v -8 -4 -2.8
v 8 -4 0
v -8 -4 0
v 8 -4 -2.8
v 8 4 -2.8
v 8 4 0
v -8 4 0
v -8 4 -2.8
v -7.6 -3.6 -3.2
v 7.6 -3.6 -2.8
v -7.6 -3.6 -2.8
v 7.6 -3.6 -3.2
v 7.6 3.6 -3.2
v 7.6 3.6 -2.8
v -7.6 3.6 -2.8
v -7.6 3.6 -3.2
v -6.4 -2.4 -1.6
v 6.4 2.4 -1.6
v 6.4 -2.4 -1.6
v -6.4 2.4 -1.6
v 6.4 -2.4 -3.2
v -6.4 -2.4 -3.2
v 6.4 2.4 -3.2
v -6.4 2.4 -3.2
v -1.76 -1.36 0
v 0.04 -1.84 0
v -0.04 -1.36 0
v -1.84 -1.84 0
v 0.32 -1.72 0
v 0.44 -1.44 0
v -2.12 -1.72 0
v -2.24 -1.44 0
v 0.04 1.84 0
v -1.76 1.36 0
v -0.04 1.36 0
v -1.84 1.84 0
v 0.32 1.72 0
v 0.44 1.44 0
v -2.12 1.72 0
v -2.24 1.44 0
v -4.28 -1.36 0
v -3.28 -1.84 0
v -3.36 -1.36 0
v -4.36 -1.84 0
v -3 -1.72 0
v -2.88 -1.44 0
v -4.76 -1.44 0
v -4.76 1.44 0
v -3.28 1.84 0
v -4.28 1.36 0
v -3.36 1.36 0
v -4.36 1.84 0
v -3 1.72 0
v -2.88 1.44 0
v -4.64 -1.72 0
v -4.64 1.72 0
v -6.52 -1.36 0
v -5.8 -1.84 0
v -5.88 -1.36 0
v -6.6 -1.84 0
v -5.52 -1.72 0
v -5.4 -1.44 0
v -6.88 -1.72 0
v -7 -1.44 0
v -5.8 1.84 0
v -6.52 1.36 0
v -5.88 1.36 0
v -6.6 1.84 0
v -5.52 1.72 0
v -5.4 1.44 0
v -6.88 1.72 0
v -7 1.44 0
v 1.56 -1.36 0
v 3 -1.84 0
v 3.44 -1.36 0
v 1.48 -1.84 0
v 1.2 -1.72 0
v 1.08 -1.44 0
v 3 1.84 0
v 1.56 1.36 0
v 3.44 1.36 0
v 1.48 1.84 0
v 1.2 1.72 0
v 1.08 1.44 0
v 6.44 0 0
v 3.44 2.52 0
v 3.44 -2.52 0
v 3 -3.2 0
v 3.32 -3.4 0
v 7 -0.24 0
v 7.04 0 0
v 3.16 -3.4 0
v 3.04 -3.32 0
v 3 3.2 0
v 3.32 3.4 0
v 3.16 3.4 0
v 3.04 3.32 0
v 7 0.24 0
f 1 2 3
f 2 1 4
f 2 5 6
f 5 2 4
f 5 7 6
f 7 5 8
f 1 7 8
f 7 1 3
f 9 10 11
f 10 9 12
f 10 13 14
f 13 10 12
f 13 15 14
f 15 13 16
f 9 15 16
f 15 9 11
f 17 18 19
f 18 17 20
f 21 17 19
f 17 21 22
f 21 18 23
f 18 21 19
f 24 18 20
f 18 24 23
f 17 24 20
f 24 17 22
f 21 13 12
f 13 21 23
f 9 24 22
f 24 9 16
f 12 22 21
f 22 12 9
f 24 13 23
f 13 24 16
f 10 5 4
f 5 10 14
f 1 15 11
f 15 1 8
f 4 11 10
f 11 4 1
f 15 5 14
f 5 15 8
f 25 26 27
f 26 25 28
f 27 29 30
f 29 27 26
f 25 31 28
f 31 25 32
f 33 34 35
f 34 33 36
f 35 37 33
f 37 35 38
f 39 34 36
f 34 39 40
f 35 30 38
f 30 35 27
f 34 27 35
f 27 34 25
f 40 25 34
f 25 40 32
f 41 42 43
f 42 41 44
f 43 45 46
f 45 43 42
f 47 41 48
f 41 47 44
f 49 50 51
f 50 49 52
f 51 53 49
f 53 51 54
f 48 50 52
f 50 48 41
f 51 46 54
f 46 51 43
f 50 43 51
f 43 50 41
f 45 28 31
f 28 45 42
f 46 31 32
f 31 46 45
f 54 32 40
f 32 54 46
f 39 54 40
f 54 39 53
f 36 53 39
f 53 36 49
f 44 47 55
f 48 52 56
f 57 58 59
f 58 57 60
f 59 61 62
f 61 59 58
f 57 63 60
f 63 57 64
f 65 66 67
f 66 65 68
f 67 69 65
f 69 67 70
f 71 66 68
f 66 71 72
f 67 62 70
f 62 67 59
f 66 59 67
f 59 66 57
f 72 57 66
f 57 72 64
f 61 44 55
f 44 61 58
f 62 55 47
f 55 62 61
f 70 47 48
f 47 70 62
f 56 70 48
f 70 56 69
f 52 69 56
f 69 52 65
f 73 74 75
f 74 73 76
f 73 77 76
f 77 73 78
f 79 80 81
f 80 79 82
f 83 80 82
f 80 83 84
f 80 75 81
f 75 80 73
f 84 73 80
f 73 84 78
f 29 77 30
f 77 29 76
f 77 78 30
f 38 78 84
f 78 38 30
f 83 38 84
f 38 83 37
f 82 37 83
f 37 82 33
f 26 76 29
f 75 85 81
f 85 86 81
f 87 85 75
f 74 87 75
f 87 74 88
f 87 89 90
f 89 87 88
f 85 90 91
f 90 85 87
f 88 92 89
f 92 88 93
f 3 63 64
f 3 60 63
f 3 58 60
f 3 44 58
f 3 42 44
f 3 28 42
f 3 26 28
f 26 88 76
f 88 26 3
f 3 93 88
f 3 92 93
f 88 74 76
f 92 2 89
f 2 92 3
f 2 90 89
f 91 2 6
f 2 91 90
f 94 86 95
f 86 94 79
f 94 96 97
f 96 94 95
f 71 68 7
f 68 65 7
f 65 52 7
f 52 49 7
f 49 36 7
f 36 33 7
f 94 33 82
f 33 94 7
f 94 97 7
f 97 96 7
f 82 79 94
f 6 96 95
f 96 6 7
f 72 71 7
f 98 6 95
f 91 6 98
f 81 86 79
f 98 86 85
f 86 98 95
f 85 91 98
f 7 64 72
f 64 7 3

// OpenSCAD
// file: ../p/box5.scad
use <../lib.scad>
function ldraw_lib__box5() = [
// 0 Box with 5 Faces and All Edges
// 0 Name: box5.dat
// 0 Author: James Jessiman
// 0 !LDRAW_ORG Primitive UPDATE 2012-01
// 0 !LICENSE Licensed under CC BY 2.0 and CC BY 4.0 : see CAreadme.txt
// 
// 0 BFC CERTIFY CCW
  [0,"BFC","CERTIFY"],
  [0,"BFC","CCW"],
// 
// 0 !HISTORY 2002-04-03 [sbliss] Modified for BFC compliance
// 0 !HISTORY 2002-04-25 [PTadmin] Official Update 2002-02
// 0 !HISTORY 2007-06-24 [PTadmin] Header formatted for Contributor Agreement
// 0 !HISTORY 2008-07-01 [PTadmin] Official Update 2008-01
// 0 !HISTORY 2012-02-16 [Philo] Changed to CCW
// 0 !HISTORY 2012-03-30 [PTadmin] Official Update 2012-01
// 
// 
// 2 24 1 1 1 -1 1 1
  [2,24,1,1,1,-1,1,1],
// 2 24 -1 1 1 -1 1 -1
  [2,24,-1,1,1,-1,1,-1],
// 2 24 -1 1 -1 1 1 -1
  [2,24,-1,1,-1,1,1,-1],
// 2 24 1 1 -1 1 1 1
  [2,24,1,1,-1,1,1,1],
// 2 24 1 0 1 -1 0 1
  [2,24,1,0,1,-1,0,1],
// 2 24 -1 0 1 -1 0 -1
  [2,24,-1,0,1,-1,0,-1],
// 2 24 -1 0 -1 1 0 -1
  [2,24,-1,0,-1,1,0,-1],
// 2 24 1 0 -1 1 0 1
  [2,24,1,0,-1,1,0,1],
// 2 24 1 0 1 1 1 1
  [2,24,1,0,1,1,1,1],
// 2 24 -1 0 1 -1 1 1
  [2,24,-1,0,1,-1,1,1],
// 2 24 1 0 -1 1 1 -1
  [2,24,1,0,-1,1,1,-1],
// 2 24 -1 0 -1 -1 1 -1
  [2,24,-1,0,-1,-1,1,-1],
// 4 16 -1 1 1 1 1 1 1 1 -1 -1 1 -1
  [4,16,-1,1,1,1,1,1,1,1,-1,-1,1,-1],
// 4 16 -1 1 1 -1 0 1 1 0 1 1 1 1
  [4,16,-1,1,1,-1,0,1,1,0,1,1,1,1],
// 4 16 -1 1 -1 -1 0 -1 -1 0 1 -1 1 1
  [4,16,-1,1,-1,-1,0,-1,-1,0,1,-1,1,1],
// 4 16 1 1 -1 1 0 -1 -1 0 -1 -1 1 -1
  [4,16,1,1,-1,1,0,-1,-1,0,-1,-1,1,-1],
// 4 16 1 1 1 1 0 1 1 0 -1 1 1 -1
  [4,16,1,1,1,1,0,1,1,0,-1,1,1,-1],
];
module ldraw_lib__box5(step=0, col=false, unit=2/5, alt=false, line=0.2, solid=!$preview)
    makepoly(ldraw_lib__box5(), step=step, col=col, unit=unit, alt=alt, line=line, solid=solid);
ldraw_lib__box5(line=0.2);
// file: ../p/box4.scad
use <../lib.scad>
function ldraw_lib__box4() = [
// 0 Box with 4 Faces (2 Parallel Pairs) and All Edges
// 0 Name: box4.dat
// 0 Author: James Jessiman
// 0 !LDRAW_ORG Primitive UPDATE 2012-01
// 0 !LICENSE Licensed under CC BY 2.0 and CC BY 4.0 : see CAreadme.txt
// 
// 0 BFC CERTIFY CCW
  [0,"BFC","CERTIFY"],
  [0,"BFC","CCW"],
// 
// 0 !HISTORY 2002-04-03 [sbliss] Modified for BFC compliance
// 0 !HISTORY 2002-04-25 [PTadmin] Official Update 2002-02
// 0 !HISTORY 2007-06-24 [PTadmin] Header formatted for Contributor Agreement
// 0 !HISTORY 2008-07-01 [PTadmin] Official Update 2008-01
// 0 !HISTORY 2012-02-16 [Philo] Changed to CCW
// 0 !HISTORY 2012-03-30 [PTadmin] Official Update 2012-01
// 
// 
// 2 24 1 1 1 -1 1 1
  [2,24,1,1,1,-1,1,1],
// 2 24 -1 1 1 -1 1 -1
  [2,24,-1,1,1,-1,1,-1],
// 2 24 -1 1 -1 1 1 -1
  [2,24,-1,1,-1,1,1,-1],
// 2 24 1 1 -1 1 1 1
  [2,24,1,1,-1,1,1,1],
// 2 24 1 0 1 -1 0 1
  [2,24,1,0,1,-1,0,1],
// 2 24 -1 0 1 -1 0 -1
  [2,24,-1,0,1,-1,0,-1],
// 2 24 -1 0 -1 1 0 -1
  [2,24,-1,0,-1,1,0,-1],
// 2 24 1 0 -1 1 0 1
  [2,24,1,0,-1,1,0,1],
// 2 24 1 0 1 1 1 1
  [2,24,1,0,1,1,1,1],
// 2 24 -1 0 1 -1 1 1
  [2,24,-1,0,1,-1,1,1],
// 2 24 1 0 -1 1 1 -1
  [2,24,1,0,-1,1,1,-1],
// 2 24 -1 0 -1 -1 1 -1
  [2,24,-1,0,-1,-1,1,-1],
// 4 16 -1 1 1 -1 0 1 1 0 1 1 1 1
  [4,16,-1,1,1,-1,0,1,1,0,1,1,1,1],
// 4 16 -1 1 -1 -1 0 -1 -1 0 1 -1 1 1
  [4,16,-1,1,-1,-1,0,-1,-1,0,1,-1,1,1],
// 4 16 1 1 -1 1 0 -1 -1 0 -1 -1 1 -1
  [4,16,1,1,-1,1,0,-1,-1,0,-1,-1,1,-1],
// 4 16 1 1 1 1 0 1 1 0 -1 1 1 -1
  [4,16,1,1,1,1,0,1,1,0,-1,1,1,-1],
];
module ldraw_lib__box4(step=0, col=false, unit=2/5, alt=false, line=0.2, solid=!$preview)
    makepoly(ldraw_lib__box4(), step=step, col=col, unit=unit, alt=alt, line=line, solid=solid);
ldraw_lib__box4(line=0.2);
// file: s/3069bs01.scad
use <../../lib.scad>
use <../../p/box4.scad>
use <../../p/box5.scad>
function ldraw_lib__s__3069bs01() = [
// 0 ~Tile  1 x  2 with Groove without Top Face
// 0 Name: s\3069bs01.dat
// 0 Author: Santeri Piippo [arezey]
// 0 !LDRAW_ORG Subpart UPDATE 2010-02
// 0 !LICENSE Licensed under CC BY 2.0 and CC BY 4.0 : see CAreadme.txt
// 
// 0 BFC CERTIFY CCW
  [0,"BFC","CERTIFY"],
  [0,"BFC","CCW"],
// 
// 0 !HISTORY 2010-07-05 [PTadmin] Official Update 2010-02
// 
// 
// 1 16 0 0 0 20 0 0 0 7 0 0 0 10 box4.dat
  [1,16,0,0,0,20,0,0,0,7,0,0,0,10, ldraw_lib__box4()],
// 1 16 0 7 0 19 0 0 0 1 0 0 0 9 box4.dat
  [1,16,0,7,0,19,0,0,0,1,0,0,0,9, ldraw_lib__box4()],
// 0 BFC INVERTNEXT
  [0,"BFC","INVERTNEXT"],
// 1 16 0 8 0 16 0 0 0 -4 0 0 0 6 box5.dat
  [1,16,0,8,0,16,0,0,0,-4,0,0,0,6, ldraw_lib__box5()],
// 4 16 -19 8 9 -16 8 6 -16 8 -6 -19 8 -9
  [4,16,-19,8,9,-16,8,6,-16,8,-6,-19,8,-9],
// 4 16 19 8 -9 16 8 -6 16 8 6 19 8 9
  [4,16,19,8,-9,16,8,-6,16,8,6,19,8,9],
// 4 16 19 8 9 16 8 6 -16 8 6 -19 8 9
  [4,16,19,8,9,16,8,6,-16,8,6,-19,8,9],
// 4 16 -19 8 -9 -16 8 -6 16 8 -6 19 8 -9
  [4,16,-19,8,-9,-16,8,-6,16,8,-6,19,8,-9],
// 4 16 -20 7 10 -19 7 9 -19 7 -9 -20 7 -10
  [4,16,-20,7,10,-19,7,9,-19,7,-9,-20,7,-10],
// 4 16 20 7 -10 19 7 -9 19 7 9 20 7 10
  [4,16,20,7,-10,19,7,-9,19,7,9,20,7,10],
// 4 16 20 7 10 19 7 9 -19 7 9 -20 7 10
  [4,16,20,7,10,19,7,9,-19,7,9,-20,7,10],
// 4 16 -20 7 -10 -19 7 -9 19 7 -9 20 7 -10
  [4,16,-20,7,-10,-19,7,-9,19,7,-9,20,7,-10],
// 0 //
];
module ldraw_lib__s__3069bs01(step=0, col=false, unit=2/5, alt=false, line=0.2, solid=!$preview)
    makepoly(ldraw_lib__s__3069bs01(), step=step, col=col, unit=unit, alt=alt, line=line, solid=solid);
ldraw_lib__s__3069bs01(line=0.2);
// main file
use <../lib.scad>
use <s/3069bs01.scad>
function ldraw_lib__3069bp19() = [
// 0 Tile  1 x  2 with Arrow Dotted Yellow with Black Border Pattern
// 0 Name: 3069bp19.dat
// 0 Author: Philippe Hurbain [Philo]
// 0 !LDRAW_ORG Part UPDATE 2017-01
// 0 !LICENSE Licensed under CC BY 2.0 and CC BY 4.0 : see CAreadme.txt
// 
// 0 BFC CERTIFY CCW
  [0,"BFC","CERTIFY"],
  [0,"BFC","CCW"],
// 
// 0 !KEYWORDS Boost, Set 17101
// 
// 0 !HISTORY 2017-12-30 [PTadmin] Official Update 2017-01
// 
// 
// 1 16 0 0 0 -1 0 0 0 1 0 0 0 -1 s\3069bs01.dat
  [1,16,0,0,0,-1,0,0,0,1,0,0,0,-1, ldraw_lib__s__3069bs01()],
// 4 0 0.1 0 -4.6 -0.1 0 -3.4 -4.4 0 -3.4 -4.6 0 -4.6
  [4,0,0.1,0,-4.6,-0.1,0,-3.4,-4.4,0,-3.4,-4.6,0,-4.6],
// 4 0 1.1 0 -3.6 -0.1 0 -3.4 0.1 0 -4.6 0.8 0 -4.3
  [4,0,1.1,0,-3.6,-0.1,0,-3.4,0.1,0,-4.6,0.8,0,-4.3],
// 4 0 -4.6 0 -4.6 -4.4 0 -3.4 -5.6 0 -3.6 -5.3 0 -4.3
  [4,0,-4.6,0,-4.6,-4.4,0,-3.4,-5.6,0,-3.6,-5.3,0,-4.3],
// 4 0 -4.4 0 3.4 -0.1 0 3.4 0.1 0 4.6 -4.6 0 4.6
  [4,0,-4.4,0,3.4,-0.1,0,3.4,0.1,0,4.6,-4.6,0,4.6],
// 4 0 0.1 0 4.6 -0.1 0 3.4 1.1 0 3.6 0.8 0 4.3
  [4,0,0.1,0,4.6,-0.1,0,3.4,1.1,0,3.6,0.8,0,4.3],
// 4 0 -5.6 0 3.6 -4.4 0 3.4 -4.6 0 4.6 -5.3 0 4.3
  [4,0,-5.6,0,3.6,-4.4,0,3.4,-4.6,0,4.6,-5.3,0,4.3],
// 4 0 -0.1 0 -3.4 1.1 0 -3.6 1.1 0 3.6 -0.1 0 3.4
  [4,0,-0.1,0,-3.4,1.1,0,-3.6,1.1,0,3.6,-0.1,0,3.4],
// 4 14 -0.1 0 -3.4 -0.1 0 3.4 -4.4 0 3.4 -4.4 0 -3.4
  [4,14,-0.1,0,-3.4,-0.1,0,3.4,-4.4,0,3.4,-4.4,0,-3.4],
// 4 0 -4.4 0 -3.4 -4.4 0 3.4 -5.6 0 3.6 -5.6 0 -3.6
  [4,0,-4.4,0,-3.4,-4.4,0,3.4,-5.6,0,3.6,-5.6,0,-3.6],
// 4 0 -8.2 0 -4.6 -8.4 0 -3.4 -10.7 0 -3.4 -10.9 0 -4.6
  [4,0,-8.2,0,-4.6,-8.4,0,-3.4,-10.7,0,-3.4,-10.9,0,-4.6],
// 4 0 -7.2 0 -3.6 -8.4 0 -3.4 -8.2 0 -4.6 -7.5 0 -4.3
  [4,0,-7.2,0,-3.6,-8.4,0,-3.4,-8.2,0,-4.6,-7.5,0,-4.3],
// 4 0 -11.9 0 -3.6 -10.9 0 -4.6 -10.7 0 -3.4 -11.9 0 3.6
  [4,0,-11.9,0,-3.6,-10.9,0,-4.6,-10.7,0,-3.4,-11.9,0,3.6],
// 4 0 -10.7 0 3.4 -8.4 0 3.4 -8.2 0 4.6 -10.9 0 4.6
  [4,0,-10.7,0,3.4,-8.4,0,3.4,-8.2,0,4.6,-10.9,0,4.6],
// 4 0 -8.2 0 4.6 -8.4 0 3.4 -7.2 0 3.6 -7.5 0 4.3
  [4,0,-8.2,0,4.6,-8.4,0,3.4,-7.2,0,3.6,-7.5,0,4.3],
// 4 0 -10.7 0 3.4 -10.9 0 4.6 -11.9 0 3.6 -10.7 0 -3.4
  [4,0,-10.7,0,3.4,-10.9,0,4.6,-11.9,0,3.6,-10.7,0,-3.4],
// 4 0 -8.4 0 -3.4 -7.2 0 -3.6 -7.2 0 3.6 -8.4 0 3.4
  [4,0,-8.4,0,-3.4,-7.2,0,-3.6,-7.2,0,3.6,-8.4,0,3.4],
// 4 14 -8.4 0 -3.4 -8.4 0 3.4 -10.7 0 3.4 -10.7 0 -3.4
  [4,14,-8.4,0,-3.4,-8.4,0,3.4,-10.7,0,3.4,-10.7,0,-3.4],
// 4 16 -7.5 0 -4.3 -8.2 0 -4.6 -4.6 0 -4.6 -5.3 0 -4.3
  [4,16,-7.5,0,-4.3,-8.2,0,-4.6,-4.6,0,-4.6,-5.3,0,-4.3],
// 4 16 -7.2 0 -3.6 -7.5 0 -4.3 -5.3 0 -4.3 -5.6 0 -3.6
  [4,16,-7.2,0,-3.6,-7.5,0,-4.3,-5.3,0,-4.3,-5.6,0,-3.6],
// 4 16 -7.2 0 3.6 -7.2 0 -3.6 -5.6 0 -3.6 -5.6 0 3.6
  [4,16,-7.2,0,3.6,-7.2,0,-3.6,-5.6,0,-3.6,-5.6,0,3.6],
// 4 16 -7.5 0 4.3 -7.2 0 3.6 -5.6 0 3.6 -5.3 0 4.3
  [4,16,-7.5,0,4.3,-7.2,0,3.6,-5.6,0,3.6,-5.3,0,4.3],
// 4 16 -8.2 0 4.6 -7.5 0 4.3 -5.3 0 4.3 -4.6 0 4.6
  [4,16,-8.2,0,4.6,-7.5,0,4.3,-5.3,0,4.3,-4.6,0,4.6],
// 3 0 -10.9 0 -4.6 -11.9 0 -3.6 -11.6 0 -4.3
  [3,0,-10.9,0,-4.6,-11.9,0,-3.6,-11.6,0,-4.3],
// 3 0 -11.9 0 3.6 -10.9 0 4.6 -11.6 0 4.3
  [3,0,-11.9,0,3.6,-10.9,0,4.6,-11.6,0,4.3],
// 4 0 -14.5 0 -4.6 -14.7 0 -3.4 -16.3 0 -3.4 -16.5 0 -4.6
  [4,0,-14.5,0,-4.6,-14.7,0,-3.4,-16.3,0,-3.4,-16.5,0,-4.6],
// 4 0 -13.5 0 -3.6 -14.7 0 -3.4 -14.5 0 -4.6 -13.8 0 -4.3
  [4,0,-13.5,0,-3.6,-14.7,0,-3.4,-14.5,0,-4.6,-13.8,0,-4.3],
// 4 0 -16.5 0 -4.6 -16.3 0 -3.4 -17.5 0 -3.6 -17.2 0 -4.3
  [4,0,-16.5,0,-4.6,-16.3,0,-3.4,-17.5,0,-3.6,-17.2,0,-4.3],
// 4 0 -16.3 0 3.4 -14.7 0 3.4 -14.5 0 4.6 -16.5 0 4.6
  [4,0,-16.3,0,3.4,-14.7,0,3.4,-14.5,0,4.6,-16.5,0,4.6],
// 4 0 -14.5 0 4.6 -14.7 0 3.4 -13.5 0 3.6 -13.8 0 4.3
  [4,0,-14.5,0,4.6,-14.7,0,3.4,-13.5,0,3.6,-13.8,0,4.3],
// 4 0 -17.5 0 3.6 -16.3 0 3.4 -16.5 0 4.6 -17.2 0 4.3
  [4,0,-17.5,0,3.6,-16.3,0,3.4,-16.5,0,4.6,-17.2,0,4.3],
// 4 0 -14.7 0 -3.4 -13.5 0 -3.6 -13.5 0 3.6 -14.7 0 3.4
  [4,0,-14.7,0,-3.4,-13.5,0,-3.6,-13.5,0,3.6,-14.7,0,3.4],
// 4 14 -14.7 0 -3.4 -14.7 0 3.4 -16.3 0 3.4 -16.3 0 -3.4
  [4,14,-14.7,0,-3.4,-14.7,0,3.4,-16.3,0,3.4,-16.3,0,-3.4],
// 4 0 -16.3 0 -3.4 -16.3 0 3.4 -17.5 0 3.6 -17.5 0 -3.6
  [4,0,-16.3,0,-3.4,-16.3,0,3.4,-17.5,0,3.6,-17.5,0,-3.6],
// 4 16 -13.8 0 -4.3 -14.5 0 -4.6 -10.9 0 -4.6 -11.6 0 -4.3
  [4,16,-13.8,0,-4.3,-14.5,0,-4.6,-10.9,0,-4.6,-11.6,0,-4.3],
// 4 16 -13.5 0 -3.6 -13.8 0 -4.3 -11.6 0 -4.3 -11.9 0 -3.6
  [4,16,-13.5,0,-3.6,-13.8,0,-4.3,-11.6,0,-4.3,-11.9,0,-3.6],
// 4 16 -13.5 0 3.6 -13.5 0 -3.6 -11.9 0 -3.6 -11.9 0 3.6
  [4,16,-13.5,0,3.6,-13.5,0,-3.6,-11.9,0,-3.6,-11.9,0,3.6],
// 4 16 -13.8 0 4.3 -13.5 0 3.6 -11.9 0 3.6 -11.6 0 4.3
  [4,16,-13.8,0,4.3,-13.5,0,3.6,-11.9,0,3.6,-11.6,0,4.3],
// 4 16 -14.5 0 4.6 -13.8 0 4.3 -11.6 0 4.3 -10.9 0 4.6
  [4,16,-14.5,0,4.6,-13.8,0,4.3,-11.6,0,4.3,-10.9,0,4.6],
// 4 0 7.5 0 -4.6 8.6 0 -3.4 3.9 0 -3.4 3.7 0 -4.6
  [4,0,7.5,0,-4.6,8.6,0,-3.4,3.9,0,-3.4,3.7,0,-4.6],
// 4 0 3.7 0 -4.6 3.9 0 -3.4 2.7 0 -3.6 3 0 -4.3
  [4,0,3.7,0,-4.6,3.9,0,-3.4,2.7,0,-3.6,3,0,-4.3],
// 4 0 3.9 0 3.4 8.6 0 3.4 7.5 0 4.6 3.7 0 4.6
  [4,0,3.9,0,3.4,8.6,0,3.4,7.5,0,4.6,3.7,0,4.6],
// 4 0 2.7 0 3.6 3.9 0 3.4 3.7 0 4.6 3 0 4.3
  [4,0,2.7,0,3.6,3.9,0,3.4,3.7,0,4.6,3,0,4.3],
// 4 14 8.6 0 -3.4 8.6 0 3.4 3.9 0 3.4 3.9 0 -3.4
  [4,14,8.6,0,-3.4,8.6,0,3.4,3.9,0,3.4,3.9,0,-3.4],
// 4 0 3.9 0 -3.4 3.9 0 3.4 2.7 0 3.6 2.7 0 -3.6
  [4,0,3.9,0,-3.4,3.9,0,3.4,2.7,0,3.6,2.7,0,-3.6],
// 4 16 0.8 0 -4.3 3.7 0 -4.6 3 0 -4.3 1.1 0 -3.6
  [4,16,0.8,0,-4.3,3.7,0,-4.6,3,0,-4.3,1.1,0,-3.6],
// 3 16 3 0 -4.3 2.7 0 -3.6 1.1 0 -3.6
  [3,16,3,0,-4.3,2.7,0,-3.6,1.1,0,-3.6],
// 4 16 1.1 0 3.6 1.1 0 -3.6 2.7 0 -3.6 2.7 0 3.6
  [4,16,1.1,0,3.6,1.1,0,-3.6,2.7,0,-3.6,2.7,0,3.6],
// 4 16 0.8 0 4.3 1.1 0 3.6 2.7 0 3.6 3 0 4.3
  [4,16,0.8,0,4.3,1.1,0,3.6,2.7,0,3.6,3,0,4.3],
// 4 16 3 0 4.3 3.7 0 4.6 0.1 0 4.6 0.8 0 4.3
  [4,16,3,0,4.3,3.7,0,4.6,0.1,0,4.6,0.8,0,4.3],
// 3 16 0.1 0 -4.6 3.7 0 -4.6 0.8 0 -4.3
  [3,16,0.1,0,-4.6,3.7,0,-4.6,0.8,0,-4.3],
// 3 14 8.6 0 -3.4 16.1 0 0 8.6 0 3.4
  [3,14,8.6,0,-3.4,16.1,0,0,8.6,0,3.4],
// 3 14 16.1 0 0 8.6 0 6.3 8.6 0 3.4
  [3,14,16.1,0,0,8.6,0,6.3,8.6,0,3.4],
// 3 14 8.6 0 -6.3 16.1 0 0 8.6 0 -3.4
  [3,14,8.6,0,-6.3,16.1,0,0,8.6,0,-3.4],
// 4 0 8.6 0 -6.3 8.6 0 -3.4 7.5 0 -4.6 7.5 0 -8
  [4,0,8.6,0,-6.3,8.6,0,-3.4,7.5,0,-4.6,7.5,0,-8],
// 4 0 8.6 0 -6.3 7.5 0 -8 8.3 0 -8.5 17.5 0 -0.6
  [4,0,8.6,0,-6.3,7.5,0,-8,8.3,0,-8.5,17.5,0,-0.6],
// 4 0 16.1 0 0 8.6 0 -6.3 17.5 0 -0.6 17.6 0 0
  [4,0,16.1,0,0,8.6,0,-6.3,17.5,0,-0.6,17.6,0,0],
// 4 0 7.9 0 -8.5 8.3 0 -8.5 7.5 0 -8 7.6 0 -8.3
  [4,0,7.9,0,-8.5,8.3,0,-8.5,7.5,0,-8,7.6,0,-8.3],
// 3 16 -20 0 -10 -17.2 0 -4.3 -17.5 0 -3.6
  [3,16,-20,0,-10,-17.2,0,-4.3,-17.5,0,-3.6],
// 3 16 -20 0 -10 -16.5 0 -4.6 -17.2 0 -4.3
  [3,16,-20,0,-10,-16.5,0,-4.6,-17.2,0,-4.3],
// 3 16 -20 0 -10 -14.5 0 -4.6 -16.5 0 -4.6
  [3,16,-20,0,-10,-14.5,0,-4.6,-16.5,0,-4.6],
// 3 16 -20 0 -10 -10.9 0 -4.6 -14.5 0 -4.6
  [3,16,-20,0,-10,-10.9,0,-4.6,-14.5,0,-4.6],
// 3 16 -20 0 -10 -8.2 0 -4.6 -10.9 0 -4.6
  [3,16,-20,0,-10,-8.2,0,-4.6,-10.9,0,-4.6],
// 3 16 -20 0 -10 -4.6 0 -4.6 -8.2 0 -4.6
  [3,16,-20,0,-10,-4.6,0,-4.6,-8.2,0,-4.6],
// 3 16 -20 0 -10 0.1 0 -4.6 -4.6 0 -4.6
  [3,16,-20,0,-10,0.1,0,-4.6,-4.6,0,-4.6],
// 4 16 3.7 0 -4.6 0.1 0 -4.6 -20 0 -10 7.5 0 -8
  [4,16,3.7,0,-4.6,0.1,0,-4.6,-20,0,-10,7.5,0,-8],
// 3 16 -20 0 -10 7.6 0 -8.3 7.5 0 -8
  [3,16,-20,0,-10,7.6,0,-8.3,7.5,0,-8],
// 3 16 -20 0 -10 7.9 0 -8.5 7.6 0 -8.3
  [3,16,-20,0,-10,7.9,0,-8.5,7.6,0,-8.3],
// 3 16 7.5 0 -8 7.5 0 -4.6 3.7 0 -4.6
  [3,16,7.5,0,-8,7.5,0,-4.6,3.7,0,-4.6],
// 4 16 7.9 0 -8.5 -20 0 -10 20 0 -10 8.3 0 -8.5
  [4,16,7.9,0,-8.5,-20,0,-10,20,0,-10,8.3,0,-8.5],
// 3 16 20 0 -10 17.5 0 -0.6 8.3 0 -8.5
  [3,16,20,0,-10,17.5,0,-0.6,8.3,0,-8.5],
// 4 16 17.6 0 0 17.5 0 -0.6 20 0 -10 20 0 10
  [4,16,17.6,0,0,17.5,0,-0.6,20,0,-10,20,0,10],
// 4 0 7.5 0 8 7.5 0 4.6 8.6 0 6.3 8.3 0 8.5
  [4,0,7.5,0,8,7.5,0,4.6,8.6,0,6.3,8.3,0,8.5],
// 4 0 7.5 0 8 8.3 0 8.5 7.9 0 8.5 7.6 0 8.3
  [4,0,7.5,0,8,8.3,0,8.5,7.9,0,8.5,7.6,0,8.3],
// 3 16 -17.2 0 4.3 -16.5 0 4.6 -20 0 10
  [3,16,-17.2,0,4.3,-16.5,0,4.6,-20,0,10],
// 3 16 -16.5 0 4.6 -14.5 0 4.6 -20 0 10
  [3,16,-16.5,0,4.6,-14.5,0,4.6,-20,0,10],
// 3 16 -14.5 0 4.6 -10.9 0 4.6 -20 0 10
  [3,16,-14.5,0,4.6,-10.9,0,4.6,-20,0,10],
// 3 16 -10.9 0 4.6 -8.2 0 4.6 -20 0 10
  [3,16,-10.9,0,4.6,-8.2,0,4.6,-20,0,10],
// 3 16 -8.2 0 4.6 -4.6 0 4.6 -20 0 10
  [3,16,-8.2,0,4.6,-4.6,0,4.6,-20,0,10],
// 3 16 -4.6 0 4.6 0.1 0 4.6 -20 0 10
  [3,16,-4.6,0,4.6,0.1,0,4.6,-20,0,10],
// 4 16 -20 0 10 0.1 0 4.6 3.7 0 4.6 7.5 0 8
  [4,16,-20,0,10,0.1,0,4.6,3.7,0,4.6,7.5,0,8],
// 3 16 7.5 0 8 7.6 0 8.3 -20 0 10
  [3,16,7.5,0,8,7.6,0,8.3,-20,0,10],
// 3 16 7.6 0 8.3 7.9 0 8.5 -20 0 10
  [3,16,7.6,0,8.3,7.9,0,8.5,-20,0,10],
// 3 16 3.7 0 4.6 7.5 0 4.6 7.5 0 8
  [3,16,3.7,0,4.6,7.5,0,4.6,7.5,0,8],
// 4 16 20 0 10 -20 0 10 7.9 0 8.5 8.3 0 8.5
  [4,16,20,0,10,-20,0,10,7.9,0,8.5,8.3,0,8.5],
// 3 16 -17.5 0 3.6 -17.2 0 4.3 -20 0 10
  [3,16,-17.5,0,3.6,-17.2,0,4.3,-20,0,10],
// 3 16 17.5 0 0.6 20 0 10 8.3 0 8.5
  [3,16,17.5,0,0.6,20,0,10,8.3,0,8.5],
// 3 16 17.6 0 0 20 0 10 17.5 0 0.6
  [3,16,17.6,0,0,20,0,10,17.5,0,0.6],
// 3 0 8.6 0 3.4 8.6 0 6.3 7.5 0 4.6
  [3,0,8.6,0,3.4,8.6,0,6.3,7.5,0,4.6],
// 4 0 17.5 0 0.6 8.3 0 8.5 8.6 0 6.3 16.1 0 0
  [4,0,17.5,0,0.6,8.3,0,8.5,8.6,0,6.3,16.1,0,0],
// 3 0 16.1 0 0 17.6 0 0 17.5 0 0.6
  [3,0,16.1,0,0,17.6,0,0,17.5,0,0.6],
// 4 16 -20 0 -10 -17.5 0 -3.6 -17.5 0 3.6 -20 0 10
  [4,16,-20,0,-10,-17.5,0,-3.6,-17.5,0,3.6,-20,0,10],
];
module ldraw_lib__3069bp19(step=0, col=false, unit=2/5, alt=false, line=0.2, solid=!$preview)
    makepoly(ldraw_lib__3069bp19(), step=step, col=col, unit=unit, alt=alt, line=line, solid=solid);
ldraw_lib__3069bp19(line=0.2);
